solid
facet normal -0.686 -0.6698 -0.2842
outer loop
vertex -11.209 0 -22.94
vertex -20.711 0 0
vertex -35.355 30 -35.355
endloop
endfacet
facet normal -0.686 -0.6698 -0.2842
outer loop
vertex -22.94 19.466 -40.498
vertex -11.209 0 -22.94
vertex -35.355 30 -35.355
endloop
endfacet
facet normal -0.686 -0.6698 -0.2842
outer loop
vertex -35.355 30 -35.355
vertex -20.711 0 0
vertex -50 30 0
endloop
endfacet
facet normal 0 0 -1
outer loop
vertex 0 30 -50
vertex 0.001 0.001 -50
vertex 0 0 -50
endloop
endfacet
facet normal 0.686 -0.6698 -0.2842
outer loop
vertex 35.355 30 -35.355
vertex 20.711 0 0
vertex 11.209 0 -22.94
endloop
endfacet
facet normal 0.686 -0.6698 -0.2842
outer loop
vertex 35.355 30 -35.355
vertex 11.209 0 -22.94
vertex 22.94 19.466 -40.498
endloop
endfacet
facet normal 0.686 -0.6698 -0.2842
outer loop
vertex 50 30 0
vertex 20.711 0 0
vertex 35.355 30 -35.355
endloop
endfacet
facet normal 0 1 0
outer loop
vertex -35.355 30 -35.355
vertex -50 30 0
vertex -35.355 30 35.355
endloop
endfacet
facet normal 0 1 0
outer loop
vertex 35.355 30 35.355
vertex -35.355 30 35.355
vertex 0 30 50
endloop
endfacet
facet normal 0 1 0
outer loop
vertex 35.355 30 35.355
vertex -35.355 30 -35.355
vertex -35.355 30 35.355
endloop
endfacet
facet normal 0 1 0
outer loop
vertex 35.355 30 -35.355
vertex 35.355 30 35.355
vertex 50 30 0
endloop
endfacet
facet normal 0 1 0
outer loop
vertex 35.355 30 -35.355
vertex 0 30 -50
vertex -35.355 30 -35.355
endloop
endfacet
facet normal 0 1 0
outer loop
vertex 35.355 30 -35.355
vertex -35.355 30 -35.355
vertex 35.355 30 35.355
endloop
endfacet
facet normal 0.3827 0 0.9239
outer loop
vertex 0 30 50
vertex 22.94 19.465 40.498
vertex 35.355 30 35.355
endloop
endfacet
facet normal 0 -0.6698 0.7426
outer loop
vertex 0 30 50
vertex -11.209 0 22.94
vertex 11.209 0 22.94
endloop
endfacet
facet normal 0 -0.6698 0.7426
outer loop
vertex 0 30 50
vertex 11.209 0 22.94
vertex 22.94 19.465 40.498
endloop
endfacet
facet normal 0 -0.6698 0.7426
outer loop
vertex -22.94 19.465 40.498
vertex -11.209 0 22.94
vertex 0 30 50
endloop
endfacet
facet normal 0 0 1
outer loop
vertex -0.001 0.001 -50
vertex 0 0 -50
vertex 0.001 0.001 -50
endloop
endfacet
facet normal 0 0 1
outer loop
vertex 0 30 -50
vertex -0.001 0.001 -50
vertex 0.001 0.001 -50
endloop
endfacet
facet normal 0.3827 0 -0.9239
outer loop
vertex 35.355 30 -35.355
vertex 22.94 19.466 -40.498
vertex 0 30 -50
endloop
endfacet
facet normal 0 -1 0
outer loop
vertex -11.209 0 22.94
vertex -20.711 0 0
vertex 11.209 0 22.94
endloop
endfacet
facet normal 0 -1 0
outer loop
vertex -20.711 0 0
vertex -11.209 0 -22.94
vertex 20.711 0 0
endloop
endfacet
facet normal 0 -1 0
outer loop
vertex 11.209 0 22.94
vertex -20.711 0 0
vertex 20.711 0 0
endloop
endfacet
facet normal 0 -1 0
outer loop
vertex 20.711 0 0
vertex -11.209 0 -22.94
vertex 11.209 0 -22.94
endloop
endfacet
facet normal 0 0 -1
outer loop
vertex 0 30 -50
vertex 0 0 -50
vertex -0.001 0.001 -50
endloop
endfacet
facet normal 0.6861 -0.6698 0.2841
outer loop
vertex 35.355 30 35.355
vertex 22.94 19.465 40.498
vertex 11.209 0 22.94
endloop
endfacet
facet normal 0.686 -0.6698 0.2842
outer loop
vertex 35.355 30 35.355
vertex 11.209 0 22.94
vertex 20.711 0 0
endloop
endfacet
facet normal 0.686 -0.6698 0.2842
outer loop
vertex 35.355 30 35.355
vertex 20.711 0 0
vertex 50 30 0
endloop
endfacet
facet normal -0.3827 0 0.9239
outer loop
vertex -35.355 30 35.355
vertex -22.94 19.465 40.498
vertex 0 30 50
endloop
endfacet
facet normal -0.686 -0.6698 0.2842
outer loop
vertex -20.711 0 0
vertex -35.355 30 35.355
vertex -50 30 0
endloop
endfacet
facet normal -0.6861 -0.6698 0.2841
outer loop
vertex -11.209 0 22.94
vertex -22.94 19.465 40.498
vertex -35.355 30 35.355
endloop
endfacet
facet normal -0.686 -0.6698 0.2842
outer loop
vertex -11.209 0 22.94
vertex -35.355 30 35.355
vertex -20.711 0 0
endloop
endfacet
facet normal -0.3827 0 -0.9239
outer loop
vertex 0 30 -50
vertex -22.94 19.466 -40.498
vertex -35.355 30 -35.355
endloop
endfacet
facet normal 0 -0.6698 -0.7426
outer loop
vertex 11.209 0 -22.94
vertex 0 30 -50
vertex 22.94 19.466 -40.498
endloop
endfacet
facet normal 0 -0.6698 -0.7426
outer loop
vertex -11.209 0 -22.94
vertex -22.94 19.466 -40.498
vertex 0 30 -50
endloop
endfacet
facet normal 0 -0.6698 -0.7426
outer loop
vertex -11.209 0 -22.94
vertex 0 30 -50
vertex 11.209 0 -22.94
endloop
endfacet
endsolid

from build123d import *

# Parameters (mm, degrees)
AUFSATZ_LINEAR_AUSTRAGEN1_DEPTH      = 30
SCHNITT_LINEAR_AUSTRAGEN1_DEPTH      = 129.06193767
SCHNITT_LINEAR_AUSTRAGEN2_DEPTH      = 129.06193767
SCHNITT_LINEAR_AUSTRAGEN3_DEPTH      = 77.811457479
SCHNITT_LINEAR_AUSTRAGEN3_DEPTH_BACK = 77.811457479


with BuildPart() as part:
    # Skizze1 → Aufsatz-Linear austragen1 (new body)
    with BuildSketch(Plane(origin=(0, 0, 0), x_dir=(1, 0, 0), z_dir=(0, 1, 0))):
        Polygon((35.355339059, -35.355339059), (50, 0), (35.355339059, 35.355339059), (0, 50), (-35.355339059, 35.355339059), (-50, 0), (-35.355339059, -35.355339059), (0, -50), align=None)
    extrude(amount=AUFSATZ_LINEAR_AUSTRAGEN1_DEPTH)

    # Skizze2 → Schnitt-Linear austragen1 (cut, through all)
    with BuildSketch(Plane(origin=(21.504503853, 0, 51.916464855), x_dir=(0.9238795325112895, 0, -0.3826834323650833), z_dir=(0.3826834323650833, 0, 0.9238795325112895))):
        Polygon((-46.193976626, 30), (-19.134171618, 0), (-46.193976626, 0), align=None)
        Polygon((46.193976626, 30), (46.193976626, 0), (19.134171618, 0), align=None)
    extrude(amount=-SCHNITT_LINEAR_AUSTRAGEN1_DEPTH, mode=Mode.SUBTRACT)

    # Skizze3 → Schnitt-Linear austragen2 (cut, through all)
    with BuildSketch(Plane(origin=(-21.504503853, 0, 51.916464855), x_dir=(0.9238795325112874, 0, 0.38268343236508817), z_dir=(-0.38268343236508817, 0, 0.9238795325112874))):
        Polygon((19.134171618, 0), (46.193976626, 30), (46.193976626, 0), align=None)
        Polygon((-46.193976626, 30), (-46.193976626, 0), (-19.133976626, 0), align=None)
    extrude(amount=-SCHNITT_LINEAR_AUSTRAGEN2_DEPTH, mode=Mode.SUBTRACT)

    # Skizze4 → Schnitt-Linear austragen3 (cut, two sides: drawn at the far end of the back side and taken through both)
    with BuildSketch(Plane(origin=(0, 0, 0), x_dir=(0, 0, -1), z_dir=(1, 0, 0)).offset(-SCHNITT_LINEAR_AUSTRAGEN3_DEPTH_BACK)):
        Polygon((-50, 30), (-50, 0), (-22.94, 0), align=None)
        Polygon((22.93974523, 0), (49.99974523, 0), (50, 30), align=None)
    extrude(amount=SCHNITT_LINEAR_AUSTRAGEN3_DEPTH + SCHNITT_LINEAR_AUSTRAGEN3_DEPTH_BACK, mode=Mode.SUBTRACT)


with BuildPart() as schnitt_linear_austragen3_piece_1:
    # of the separate pieces the step leaves, piece 1, a body of its own (schnitt_linear_austragen3_pieces)
    add(part.part.solids().sort_by_distance((35.355339059, 30, 35.355339059))[0])


with BuildPart() as schnitt_linear_austragen3_piece_2:
    # of the separate pieces the step leaves, piece 2, a body of its own (schnitt_linear_austragen3_pieces)
    add(part.part.solids().sort_by_distance((0.000105529, 8.9544e-05, -49.999956288))[0])


solid = Compound([schnitt_linear_austragen3_piece_1.part, schnitt_linear_austragen3_piece_2.part])
